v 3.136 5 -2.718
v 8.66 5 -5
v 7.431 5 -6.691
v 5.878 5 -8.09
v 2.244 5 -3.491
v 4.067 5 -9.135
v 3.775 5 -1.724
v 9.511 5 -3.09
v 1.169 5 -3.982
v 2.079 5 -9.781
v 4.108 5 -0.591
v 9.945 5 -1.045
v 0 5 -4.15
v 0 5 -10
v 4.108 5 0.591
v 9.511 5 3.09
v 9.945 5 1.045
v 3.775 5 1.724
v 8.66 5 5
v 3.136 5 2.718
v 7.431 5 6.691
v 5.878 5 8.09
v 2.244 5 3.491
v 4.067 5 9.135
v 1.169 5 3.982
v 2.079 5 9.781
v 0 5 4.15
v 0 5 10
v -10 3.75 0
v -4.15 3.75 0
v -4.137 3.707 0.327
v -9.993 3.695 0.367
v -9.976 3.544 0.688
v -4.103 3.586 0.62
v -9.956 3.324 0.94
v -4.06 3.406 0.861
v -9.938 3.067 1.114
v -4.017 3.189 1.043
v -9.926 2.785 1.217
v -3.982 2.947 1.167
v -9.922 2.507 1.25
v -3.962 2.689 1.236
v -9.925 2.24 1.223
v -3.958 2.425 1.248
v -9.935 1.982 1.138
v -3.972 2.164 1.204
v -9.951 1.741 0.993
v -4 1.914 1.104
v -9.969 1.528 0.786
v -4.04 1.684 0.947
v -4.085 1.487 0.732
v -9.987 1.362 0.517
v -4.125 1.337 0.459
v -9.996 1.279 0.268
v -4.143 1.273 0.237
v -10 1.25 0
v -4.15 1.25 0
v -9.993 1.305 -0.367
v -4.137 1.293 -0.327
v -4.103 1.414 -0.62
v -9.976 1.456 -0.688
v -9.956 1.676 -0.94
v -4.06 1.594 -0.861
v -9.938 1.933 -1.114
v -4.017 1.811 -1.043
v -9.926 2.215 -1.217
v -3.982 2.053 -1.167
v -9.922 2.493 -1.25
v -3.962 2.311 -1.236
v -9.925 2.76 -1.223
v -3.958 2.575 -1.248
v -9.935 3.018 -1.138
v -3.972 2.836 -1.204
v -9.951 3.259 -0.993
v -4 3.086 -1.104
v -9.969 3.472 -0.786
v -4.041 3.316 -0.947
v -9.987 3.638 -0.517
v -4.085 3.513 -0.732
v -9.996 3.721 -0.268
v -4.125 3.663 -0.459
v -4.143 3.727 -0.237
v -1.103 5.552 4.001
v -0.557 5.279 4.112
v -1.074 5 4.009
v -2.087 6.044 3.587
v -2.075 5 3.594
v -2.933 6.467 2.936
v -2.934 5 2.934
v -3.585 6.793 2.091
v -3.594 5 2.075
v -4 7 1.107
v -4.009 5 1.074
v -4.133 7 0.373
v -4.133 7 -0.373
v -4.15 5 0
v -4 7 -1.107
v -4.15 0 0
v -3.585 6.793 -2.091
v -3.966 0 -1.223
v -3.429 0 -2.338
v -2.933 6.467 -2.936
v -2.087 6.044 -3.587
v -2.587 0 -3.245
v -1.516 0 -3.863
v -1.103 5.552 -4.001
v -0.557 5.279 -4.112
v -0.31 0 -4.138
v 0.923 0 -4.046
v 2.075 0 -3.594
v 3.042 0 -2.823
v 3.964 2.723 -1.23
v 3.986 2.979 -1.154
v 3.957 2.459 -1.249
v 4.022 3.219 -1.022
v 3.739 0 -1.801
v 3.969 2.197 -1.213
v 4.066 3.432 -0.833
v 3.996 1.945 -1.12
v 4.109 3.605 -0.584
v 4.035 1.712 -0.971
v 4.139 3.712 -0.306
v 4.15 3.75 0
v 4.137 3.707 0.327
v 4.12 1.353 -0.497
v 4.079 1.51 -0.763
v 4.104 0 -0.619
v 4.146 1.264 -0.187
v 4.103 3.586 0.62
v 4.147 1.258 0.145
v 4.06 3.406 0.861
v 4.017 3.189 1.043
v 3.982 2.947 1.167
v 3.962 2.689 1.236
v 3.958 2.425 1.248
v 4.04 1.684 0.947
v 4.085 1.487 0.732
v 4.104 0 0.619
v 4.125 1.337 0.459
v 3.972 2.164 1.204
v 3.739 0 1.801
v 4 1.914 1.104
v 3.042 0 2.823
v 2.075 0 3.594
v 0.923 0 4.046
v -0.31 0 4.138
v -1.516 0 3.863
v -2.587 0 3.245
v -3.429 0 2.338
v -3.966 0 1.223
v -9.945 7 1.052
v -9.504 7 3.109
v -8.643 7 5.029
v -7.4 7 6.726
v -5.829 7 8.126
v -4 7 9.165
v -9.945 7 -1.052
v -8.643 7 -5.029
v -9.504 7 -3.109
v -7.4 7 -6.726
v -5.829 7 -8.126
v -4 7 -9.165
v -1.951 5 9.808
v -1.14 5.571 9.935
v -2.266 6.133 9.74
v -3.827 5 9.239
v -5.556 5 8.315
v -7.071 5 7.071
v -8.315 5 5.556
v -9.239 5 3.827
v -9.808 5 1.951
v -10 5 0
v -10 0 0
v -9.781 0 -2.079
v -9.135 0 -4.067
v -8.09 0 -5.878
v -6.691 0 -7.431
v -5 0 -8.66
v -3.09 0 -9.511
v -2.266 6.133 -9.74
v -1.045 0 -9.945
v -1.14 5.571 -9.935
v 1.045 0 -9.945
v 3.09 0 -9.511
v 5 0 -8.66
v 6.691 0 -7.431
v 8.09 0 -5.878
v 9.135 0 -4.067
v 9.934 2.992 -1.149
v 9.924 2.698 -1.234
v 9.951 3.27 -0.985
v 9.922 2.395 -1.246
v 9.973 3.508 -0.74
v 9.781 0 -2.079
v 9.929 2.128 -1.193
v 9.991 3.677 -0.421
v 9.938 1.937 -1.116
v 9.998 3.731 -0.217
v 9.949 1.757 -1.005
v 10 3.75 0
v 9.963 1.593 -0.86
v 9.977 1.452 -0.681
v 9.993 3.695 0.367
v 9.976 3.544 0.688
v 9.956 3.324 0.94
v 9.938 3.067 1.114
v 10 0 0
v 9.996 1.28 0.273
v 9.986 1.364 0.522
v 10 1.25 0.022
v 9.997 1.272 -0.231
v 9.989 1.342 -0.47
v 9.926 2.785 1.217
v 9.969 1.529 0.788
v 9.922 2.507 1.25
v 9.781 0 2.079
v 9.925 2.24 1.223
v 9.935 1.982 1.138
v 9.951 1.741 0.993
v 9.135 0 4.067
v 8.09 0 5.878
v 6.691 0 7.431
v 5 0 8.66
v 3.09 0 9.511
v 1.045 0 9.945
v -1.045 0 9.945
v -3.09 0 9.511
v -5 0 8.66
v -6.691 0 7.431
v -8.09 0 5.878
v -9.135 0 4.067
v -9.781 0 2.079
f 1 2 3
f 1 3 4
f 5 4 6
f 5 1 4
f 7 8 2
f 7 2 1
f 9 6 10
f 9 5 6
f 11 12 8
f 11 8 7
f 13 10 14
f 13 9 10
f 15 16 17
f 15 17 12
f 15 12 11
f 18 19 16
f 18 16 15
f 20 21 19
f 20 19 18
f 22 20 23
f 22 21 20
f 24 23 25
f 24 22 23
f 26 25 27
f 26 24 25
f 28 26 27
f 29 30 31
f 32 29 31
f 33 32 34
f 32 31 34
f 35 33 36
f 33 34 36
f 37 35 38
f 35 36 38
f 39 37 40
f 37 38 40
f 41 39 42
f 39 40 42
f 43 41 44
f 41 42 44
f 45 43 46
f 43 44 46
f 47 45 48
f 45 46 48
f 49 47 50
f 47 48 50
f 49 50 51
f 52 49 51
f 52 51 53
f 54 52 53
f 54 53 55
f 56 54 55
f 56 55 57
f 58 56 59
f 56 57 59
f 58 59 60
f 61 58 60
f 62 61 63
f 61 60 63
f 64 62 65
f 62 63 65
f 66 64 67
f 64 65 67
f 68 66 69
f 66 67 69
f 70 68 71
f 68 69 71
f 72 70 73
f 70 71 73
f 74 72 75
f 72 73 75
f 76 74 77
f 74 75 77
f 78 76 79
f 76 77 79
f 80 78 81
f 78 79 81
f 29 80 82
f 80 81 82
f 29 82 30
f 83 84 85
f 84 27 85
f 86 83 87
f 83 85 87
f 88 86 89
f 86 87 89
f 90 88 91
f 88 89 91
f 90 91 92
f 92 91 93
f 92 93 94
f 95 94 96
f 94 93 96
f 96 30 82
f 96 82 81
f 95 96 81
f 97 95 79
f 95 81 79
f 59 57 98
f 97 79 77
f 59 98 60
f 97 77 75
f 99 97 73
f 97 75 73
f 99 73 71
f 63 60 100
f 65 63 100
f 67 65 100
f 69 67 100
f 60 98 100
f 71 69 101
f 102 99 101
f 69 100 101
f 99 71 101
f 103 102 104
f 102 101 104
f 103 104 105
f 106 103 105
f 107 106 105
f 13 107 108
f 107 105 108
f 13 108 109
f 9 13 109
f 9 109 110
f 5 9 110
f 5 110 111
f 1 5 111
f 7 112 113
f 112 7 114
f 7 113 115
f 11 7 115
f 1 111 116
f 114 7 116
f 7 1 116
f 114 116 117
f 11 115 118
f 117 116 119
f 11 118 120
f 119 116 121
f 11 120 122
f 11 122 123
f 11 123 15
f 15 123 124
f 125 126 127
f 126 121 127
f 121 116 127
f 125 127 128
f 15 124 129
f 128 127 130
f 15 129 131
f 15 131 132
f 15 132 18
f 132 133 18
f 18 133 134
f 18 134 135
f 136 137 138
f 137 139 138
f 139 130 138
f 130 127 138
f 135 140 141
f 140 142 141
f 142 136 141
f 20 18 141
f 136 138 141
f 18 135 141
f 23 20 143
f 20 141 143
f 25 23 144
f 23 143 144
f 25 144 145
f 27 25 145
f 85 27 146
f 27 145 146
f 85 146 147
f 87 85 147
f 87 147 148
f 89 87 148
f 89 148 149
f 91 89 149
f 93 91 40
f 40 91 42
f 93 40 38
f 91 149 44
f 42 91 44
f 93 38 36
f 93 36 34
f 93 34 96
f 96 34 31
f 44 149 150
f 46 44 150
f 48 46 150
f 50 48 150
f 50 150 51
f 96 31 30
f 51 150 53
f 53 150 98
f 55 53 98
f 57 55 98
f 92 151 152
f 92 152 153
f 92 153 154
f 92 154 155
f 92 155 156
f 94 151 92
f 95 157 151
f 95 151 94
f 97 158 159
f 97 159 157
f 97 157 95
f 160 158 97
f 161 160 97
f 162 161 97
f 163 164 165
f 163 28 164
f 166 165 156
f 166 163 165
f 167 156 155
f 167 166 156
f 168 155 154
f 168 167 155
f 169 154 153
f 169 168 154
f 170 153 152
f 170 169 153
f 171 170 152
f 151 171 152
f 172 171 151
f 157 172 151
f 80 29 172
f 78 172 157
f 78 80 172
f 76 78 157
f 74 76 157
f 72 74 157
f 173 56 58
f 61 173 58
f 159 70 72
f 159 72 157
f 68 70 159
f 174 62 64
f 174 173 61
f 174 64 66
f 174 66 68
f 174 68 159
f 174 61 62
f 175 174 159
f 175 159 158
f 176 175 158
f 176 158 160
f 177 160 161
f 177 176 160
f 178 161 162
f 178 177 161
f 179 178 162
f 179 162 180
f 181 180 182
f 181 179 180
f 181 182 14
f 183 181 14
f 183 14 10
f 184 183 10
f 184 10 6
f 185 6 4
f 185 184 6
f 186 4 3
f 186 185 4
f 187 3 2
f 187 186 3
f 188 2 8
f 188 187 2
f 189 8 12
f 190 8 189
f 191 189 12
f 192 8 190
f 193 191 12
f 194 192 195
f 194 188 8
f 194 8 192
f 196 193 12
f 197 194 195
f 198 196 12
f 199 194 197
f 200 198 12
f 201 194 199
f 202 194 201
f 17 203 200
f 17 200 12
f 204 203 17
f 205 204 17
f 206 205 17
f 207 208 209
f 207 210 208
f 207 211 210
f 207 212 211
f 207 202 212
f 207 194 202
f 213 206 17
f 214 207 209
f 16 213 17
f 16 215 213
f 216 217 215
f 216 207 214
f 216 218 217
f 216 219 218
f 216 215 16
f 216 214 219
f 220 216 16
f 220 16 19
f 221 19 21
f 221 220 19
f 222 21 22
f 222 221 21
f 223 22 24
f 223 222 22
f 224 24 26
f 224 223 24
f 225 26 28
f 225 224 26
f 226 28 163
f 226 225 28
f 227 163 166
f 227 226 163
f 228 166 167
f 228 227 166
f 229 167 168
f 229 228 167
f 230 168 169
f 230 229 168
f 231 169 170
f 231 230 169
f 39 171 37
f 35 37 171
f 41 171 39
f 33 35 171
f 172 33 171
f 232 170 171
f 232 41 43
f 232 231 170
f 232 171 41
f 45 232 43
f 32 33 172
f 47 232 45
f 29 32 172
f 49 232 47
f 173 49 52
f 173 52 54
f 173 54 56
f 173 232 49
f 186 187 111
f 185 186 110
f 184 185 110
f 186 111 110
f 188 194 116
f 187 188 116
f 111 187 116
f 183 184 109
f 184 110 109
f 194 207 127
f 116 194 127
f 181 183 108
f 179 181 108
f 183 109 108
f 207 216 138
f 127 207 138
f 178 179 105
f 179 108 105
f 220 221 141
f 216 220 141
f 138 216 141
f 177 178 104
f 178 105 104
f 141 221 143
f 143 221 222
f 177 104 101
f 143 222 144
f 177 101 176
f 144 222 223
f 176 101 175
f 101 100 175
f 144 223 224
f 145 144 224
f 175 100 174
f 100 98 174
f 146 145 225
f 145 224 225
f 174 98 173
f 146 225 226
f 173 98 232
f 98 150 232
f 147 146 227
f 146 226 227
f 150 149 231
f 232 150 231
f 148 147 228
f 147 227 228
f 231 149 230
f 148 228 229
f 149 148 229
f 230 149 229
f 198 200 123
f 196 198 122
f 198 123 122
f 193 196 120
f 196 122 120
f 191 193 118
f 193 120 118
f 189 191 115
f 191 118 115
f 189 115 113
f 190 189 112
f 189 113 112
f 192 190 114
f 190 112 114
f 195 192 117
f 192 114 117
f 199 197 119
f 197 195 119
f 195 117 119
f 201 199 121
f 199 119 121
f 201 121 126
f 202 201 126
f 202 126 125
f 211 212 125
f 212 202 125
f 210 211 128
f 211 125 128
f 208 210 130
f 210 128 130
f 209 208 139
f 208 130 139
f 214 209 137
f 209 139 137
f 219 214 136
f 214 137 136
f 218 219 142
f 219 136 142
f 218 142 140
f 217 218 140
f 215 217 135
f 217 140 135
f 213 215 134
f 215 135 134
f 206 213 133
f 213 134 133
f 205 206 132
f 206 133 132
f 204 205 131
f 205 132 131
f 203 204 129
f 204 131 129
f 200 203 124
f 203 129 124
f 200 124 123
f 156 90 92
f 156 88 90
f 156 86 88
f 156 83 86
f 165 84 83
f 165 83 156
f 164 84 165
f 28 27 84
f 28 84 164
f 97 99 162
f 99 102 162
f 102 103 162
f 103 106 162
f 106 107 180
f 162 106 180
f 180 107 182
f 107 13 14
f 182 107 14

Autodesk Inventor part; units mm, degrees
ref_plane "YZ Plane" through (0, 0, 0) normal (1, 0, 0) x (0, 1, 0)
ref_plane "XZ Plane" through (0, 0, 0) normal (0, 1, 0) x (-1, 0, 0)
ref_plane "XY Plane" through (0, 0, 0) normal (0, 0, 1) x (1, 0, 0)
sketch "Sketch1" plane through (0, 0, 0) normal (0, 1, 0) x (-1, 0, 0)
  circle A0 centre (0, 0) radius 10
  circle A1 centre (0, 0) radius 4.15
  dimension "d0" = 20
  dimension "d1" = 8.3
extrude "Extrusion1" add sketch "Sketch1" along normal blind 5
sketch "Sketch2" plane through (0, 5, 0) normal (0, 1, 0) x (1, 0, 0)
  circle A0 centre (0, 0) radius 4.15 construction
  circle A1 centre (0, 0) radius 10 construction
  circle A2 centre (0, 0) radius 4.15 projected
  line L0 (0, -4.15) -> (0, -10)
  circle A3 centre (0, 0) radius 10 projected
  line L1 (0, 4.15) -> (0, 10)
  line L2 (14, 0) -> (-14, 0) construction
  arc A4 (0, 4.15) -> (0, -4.15) centre (0, 0) ccw construction
  arc A5 (0, 10) -> (0, -10) centre (0, 0) ccw
  arc A6 (0, 4.15) -> (0, -4.15) centre (0, 0) ccw
  line L3 (0, 0) -> (0, -10) construction
  point P0 (0, 4.15)
  dimension "d4" = 90
extrude "Extrusion2" add sketch "Sketch2" along normal blind 2 contours A2 L0 A3 L1 picked at (-0.7977, -7.9531)
chamfer "Chamfer4" distance 4 distance2 2 1 edges at (0, 7, 7.075) measured on face at (-4.6768, 7, -6.482)
chamfer "Chamfer5" distance 4 distance2 2 1 edges at (0, 7, -7.075) measured on face at (-4.7092, 7, 6.0583)
sketch "Sketch3" plane through (0, 0, 0) normal (1, 0, 0) x (0, 1, 0)
  line L0 (5, 4.15) -> (5, -4.15) construction
  line L1 (5, -10) -> (5, 10) construction
  line L2 (0, -10) -> (0, 10) construction
  line L3 (-1.4, 0) -> (8.4, 0) construction
  circle A0 centre (2.5, 0) radius 1.25
  point P0 (0, 0)
  dimension "d22" = 2.5
  dimension "d23" = 2.5
extrude "Extrusion3" cut sketch "Sketch3" along normal through all both and the other way through all
properties part number "ang_wedge"
